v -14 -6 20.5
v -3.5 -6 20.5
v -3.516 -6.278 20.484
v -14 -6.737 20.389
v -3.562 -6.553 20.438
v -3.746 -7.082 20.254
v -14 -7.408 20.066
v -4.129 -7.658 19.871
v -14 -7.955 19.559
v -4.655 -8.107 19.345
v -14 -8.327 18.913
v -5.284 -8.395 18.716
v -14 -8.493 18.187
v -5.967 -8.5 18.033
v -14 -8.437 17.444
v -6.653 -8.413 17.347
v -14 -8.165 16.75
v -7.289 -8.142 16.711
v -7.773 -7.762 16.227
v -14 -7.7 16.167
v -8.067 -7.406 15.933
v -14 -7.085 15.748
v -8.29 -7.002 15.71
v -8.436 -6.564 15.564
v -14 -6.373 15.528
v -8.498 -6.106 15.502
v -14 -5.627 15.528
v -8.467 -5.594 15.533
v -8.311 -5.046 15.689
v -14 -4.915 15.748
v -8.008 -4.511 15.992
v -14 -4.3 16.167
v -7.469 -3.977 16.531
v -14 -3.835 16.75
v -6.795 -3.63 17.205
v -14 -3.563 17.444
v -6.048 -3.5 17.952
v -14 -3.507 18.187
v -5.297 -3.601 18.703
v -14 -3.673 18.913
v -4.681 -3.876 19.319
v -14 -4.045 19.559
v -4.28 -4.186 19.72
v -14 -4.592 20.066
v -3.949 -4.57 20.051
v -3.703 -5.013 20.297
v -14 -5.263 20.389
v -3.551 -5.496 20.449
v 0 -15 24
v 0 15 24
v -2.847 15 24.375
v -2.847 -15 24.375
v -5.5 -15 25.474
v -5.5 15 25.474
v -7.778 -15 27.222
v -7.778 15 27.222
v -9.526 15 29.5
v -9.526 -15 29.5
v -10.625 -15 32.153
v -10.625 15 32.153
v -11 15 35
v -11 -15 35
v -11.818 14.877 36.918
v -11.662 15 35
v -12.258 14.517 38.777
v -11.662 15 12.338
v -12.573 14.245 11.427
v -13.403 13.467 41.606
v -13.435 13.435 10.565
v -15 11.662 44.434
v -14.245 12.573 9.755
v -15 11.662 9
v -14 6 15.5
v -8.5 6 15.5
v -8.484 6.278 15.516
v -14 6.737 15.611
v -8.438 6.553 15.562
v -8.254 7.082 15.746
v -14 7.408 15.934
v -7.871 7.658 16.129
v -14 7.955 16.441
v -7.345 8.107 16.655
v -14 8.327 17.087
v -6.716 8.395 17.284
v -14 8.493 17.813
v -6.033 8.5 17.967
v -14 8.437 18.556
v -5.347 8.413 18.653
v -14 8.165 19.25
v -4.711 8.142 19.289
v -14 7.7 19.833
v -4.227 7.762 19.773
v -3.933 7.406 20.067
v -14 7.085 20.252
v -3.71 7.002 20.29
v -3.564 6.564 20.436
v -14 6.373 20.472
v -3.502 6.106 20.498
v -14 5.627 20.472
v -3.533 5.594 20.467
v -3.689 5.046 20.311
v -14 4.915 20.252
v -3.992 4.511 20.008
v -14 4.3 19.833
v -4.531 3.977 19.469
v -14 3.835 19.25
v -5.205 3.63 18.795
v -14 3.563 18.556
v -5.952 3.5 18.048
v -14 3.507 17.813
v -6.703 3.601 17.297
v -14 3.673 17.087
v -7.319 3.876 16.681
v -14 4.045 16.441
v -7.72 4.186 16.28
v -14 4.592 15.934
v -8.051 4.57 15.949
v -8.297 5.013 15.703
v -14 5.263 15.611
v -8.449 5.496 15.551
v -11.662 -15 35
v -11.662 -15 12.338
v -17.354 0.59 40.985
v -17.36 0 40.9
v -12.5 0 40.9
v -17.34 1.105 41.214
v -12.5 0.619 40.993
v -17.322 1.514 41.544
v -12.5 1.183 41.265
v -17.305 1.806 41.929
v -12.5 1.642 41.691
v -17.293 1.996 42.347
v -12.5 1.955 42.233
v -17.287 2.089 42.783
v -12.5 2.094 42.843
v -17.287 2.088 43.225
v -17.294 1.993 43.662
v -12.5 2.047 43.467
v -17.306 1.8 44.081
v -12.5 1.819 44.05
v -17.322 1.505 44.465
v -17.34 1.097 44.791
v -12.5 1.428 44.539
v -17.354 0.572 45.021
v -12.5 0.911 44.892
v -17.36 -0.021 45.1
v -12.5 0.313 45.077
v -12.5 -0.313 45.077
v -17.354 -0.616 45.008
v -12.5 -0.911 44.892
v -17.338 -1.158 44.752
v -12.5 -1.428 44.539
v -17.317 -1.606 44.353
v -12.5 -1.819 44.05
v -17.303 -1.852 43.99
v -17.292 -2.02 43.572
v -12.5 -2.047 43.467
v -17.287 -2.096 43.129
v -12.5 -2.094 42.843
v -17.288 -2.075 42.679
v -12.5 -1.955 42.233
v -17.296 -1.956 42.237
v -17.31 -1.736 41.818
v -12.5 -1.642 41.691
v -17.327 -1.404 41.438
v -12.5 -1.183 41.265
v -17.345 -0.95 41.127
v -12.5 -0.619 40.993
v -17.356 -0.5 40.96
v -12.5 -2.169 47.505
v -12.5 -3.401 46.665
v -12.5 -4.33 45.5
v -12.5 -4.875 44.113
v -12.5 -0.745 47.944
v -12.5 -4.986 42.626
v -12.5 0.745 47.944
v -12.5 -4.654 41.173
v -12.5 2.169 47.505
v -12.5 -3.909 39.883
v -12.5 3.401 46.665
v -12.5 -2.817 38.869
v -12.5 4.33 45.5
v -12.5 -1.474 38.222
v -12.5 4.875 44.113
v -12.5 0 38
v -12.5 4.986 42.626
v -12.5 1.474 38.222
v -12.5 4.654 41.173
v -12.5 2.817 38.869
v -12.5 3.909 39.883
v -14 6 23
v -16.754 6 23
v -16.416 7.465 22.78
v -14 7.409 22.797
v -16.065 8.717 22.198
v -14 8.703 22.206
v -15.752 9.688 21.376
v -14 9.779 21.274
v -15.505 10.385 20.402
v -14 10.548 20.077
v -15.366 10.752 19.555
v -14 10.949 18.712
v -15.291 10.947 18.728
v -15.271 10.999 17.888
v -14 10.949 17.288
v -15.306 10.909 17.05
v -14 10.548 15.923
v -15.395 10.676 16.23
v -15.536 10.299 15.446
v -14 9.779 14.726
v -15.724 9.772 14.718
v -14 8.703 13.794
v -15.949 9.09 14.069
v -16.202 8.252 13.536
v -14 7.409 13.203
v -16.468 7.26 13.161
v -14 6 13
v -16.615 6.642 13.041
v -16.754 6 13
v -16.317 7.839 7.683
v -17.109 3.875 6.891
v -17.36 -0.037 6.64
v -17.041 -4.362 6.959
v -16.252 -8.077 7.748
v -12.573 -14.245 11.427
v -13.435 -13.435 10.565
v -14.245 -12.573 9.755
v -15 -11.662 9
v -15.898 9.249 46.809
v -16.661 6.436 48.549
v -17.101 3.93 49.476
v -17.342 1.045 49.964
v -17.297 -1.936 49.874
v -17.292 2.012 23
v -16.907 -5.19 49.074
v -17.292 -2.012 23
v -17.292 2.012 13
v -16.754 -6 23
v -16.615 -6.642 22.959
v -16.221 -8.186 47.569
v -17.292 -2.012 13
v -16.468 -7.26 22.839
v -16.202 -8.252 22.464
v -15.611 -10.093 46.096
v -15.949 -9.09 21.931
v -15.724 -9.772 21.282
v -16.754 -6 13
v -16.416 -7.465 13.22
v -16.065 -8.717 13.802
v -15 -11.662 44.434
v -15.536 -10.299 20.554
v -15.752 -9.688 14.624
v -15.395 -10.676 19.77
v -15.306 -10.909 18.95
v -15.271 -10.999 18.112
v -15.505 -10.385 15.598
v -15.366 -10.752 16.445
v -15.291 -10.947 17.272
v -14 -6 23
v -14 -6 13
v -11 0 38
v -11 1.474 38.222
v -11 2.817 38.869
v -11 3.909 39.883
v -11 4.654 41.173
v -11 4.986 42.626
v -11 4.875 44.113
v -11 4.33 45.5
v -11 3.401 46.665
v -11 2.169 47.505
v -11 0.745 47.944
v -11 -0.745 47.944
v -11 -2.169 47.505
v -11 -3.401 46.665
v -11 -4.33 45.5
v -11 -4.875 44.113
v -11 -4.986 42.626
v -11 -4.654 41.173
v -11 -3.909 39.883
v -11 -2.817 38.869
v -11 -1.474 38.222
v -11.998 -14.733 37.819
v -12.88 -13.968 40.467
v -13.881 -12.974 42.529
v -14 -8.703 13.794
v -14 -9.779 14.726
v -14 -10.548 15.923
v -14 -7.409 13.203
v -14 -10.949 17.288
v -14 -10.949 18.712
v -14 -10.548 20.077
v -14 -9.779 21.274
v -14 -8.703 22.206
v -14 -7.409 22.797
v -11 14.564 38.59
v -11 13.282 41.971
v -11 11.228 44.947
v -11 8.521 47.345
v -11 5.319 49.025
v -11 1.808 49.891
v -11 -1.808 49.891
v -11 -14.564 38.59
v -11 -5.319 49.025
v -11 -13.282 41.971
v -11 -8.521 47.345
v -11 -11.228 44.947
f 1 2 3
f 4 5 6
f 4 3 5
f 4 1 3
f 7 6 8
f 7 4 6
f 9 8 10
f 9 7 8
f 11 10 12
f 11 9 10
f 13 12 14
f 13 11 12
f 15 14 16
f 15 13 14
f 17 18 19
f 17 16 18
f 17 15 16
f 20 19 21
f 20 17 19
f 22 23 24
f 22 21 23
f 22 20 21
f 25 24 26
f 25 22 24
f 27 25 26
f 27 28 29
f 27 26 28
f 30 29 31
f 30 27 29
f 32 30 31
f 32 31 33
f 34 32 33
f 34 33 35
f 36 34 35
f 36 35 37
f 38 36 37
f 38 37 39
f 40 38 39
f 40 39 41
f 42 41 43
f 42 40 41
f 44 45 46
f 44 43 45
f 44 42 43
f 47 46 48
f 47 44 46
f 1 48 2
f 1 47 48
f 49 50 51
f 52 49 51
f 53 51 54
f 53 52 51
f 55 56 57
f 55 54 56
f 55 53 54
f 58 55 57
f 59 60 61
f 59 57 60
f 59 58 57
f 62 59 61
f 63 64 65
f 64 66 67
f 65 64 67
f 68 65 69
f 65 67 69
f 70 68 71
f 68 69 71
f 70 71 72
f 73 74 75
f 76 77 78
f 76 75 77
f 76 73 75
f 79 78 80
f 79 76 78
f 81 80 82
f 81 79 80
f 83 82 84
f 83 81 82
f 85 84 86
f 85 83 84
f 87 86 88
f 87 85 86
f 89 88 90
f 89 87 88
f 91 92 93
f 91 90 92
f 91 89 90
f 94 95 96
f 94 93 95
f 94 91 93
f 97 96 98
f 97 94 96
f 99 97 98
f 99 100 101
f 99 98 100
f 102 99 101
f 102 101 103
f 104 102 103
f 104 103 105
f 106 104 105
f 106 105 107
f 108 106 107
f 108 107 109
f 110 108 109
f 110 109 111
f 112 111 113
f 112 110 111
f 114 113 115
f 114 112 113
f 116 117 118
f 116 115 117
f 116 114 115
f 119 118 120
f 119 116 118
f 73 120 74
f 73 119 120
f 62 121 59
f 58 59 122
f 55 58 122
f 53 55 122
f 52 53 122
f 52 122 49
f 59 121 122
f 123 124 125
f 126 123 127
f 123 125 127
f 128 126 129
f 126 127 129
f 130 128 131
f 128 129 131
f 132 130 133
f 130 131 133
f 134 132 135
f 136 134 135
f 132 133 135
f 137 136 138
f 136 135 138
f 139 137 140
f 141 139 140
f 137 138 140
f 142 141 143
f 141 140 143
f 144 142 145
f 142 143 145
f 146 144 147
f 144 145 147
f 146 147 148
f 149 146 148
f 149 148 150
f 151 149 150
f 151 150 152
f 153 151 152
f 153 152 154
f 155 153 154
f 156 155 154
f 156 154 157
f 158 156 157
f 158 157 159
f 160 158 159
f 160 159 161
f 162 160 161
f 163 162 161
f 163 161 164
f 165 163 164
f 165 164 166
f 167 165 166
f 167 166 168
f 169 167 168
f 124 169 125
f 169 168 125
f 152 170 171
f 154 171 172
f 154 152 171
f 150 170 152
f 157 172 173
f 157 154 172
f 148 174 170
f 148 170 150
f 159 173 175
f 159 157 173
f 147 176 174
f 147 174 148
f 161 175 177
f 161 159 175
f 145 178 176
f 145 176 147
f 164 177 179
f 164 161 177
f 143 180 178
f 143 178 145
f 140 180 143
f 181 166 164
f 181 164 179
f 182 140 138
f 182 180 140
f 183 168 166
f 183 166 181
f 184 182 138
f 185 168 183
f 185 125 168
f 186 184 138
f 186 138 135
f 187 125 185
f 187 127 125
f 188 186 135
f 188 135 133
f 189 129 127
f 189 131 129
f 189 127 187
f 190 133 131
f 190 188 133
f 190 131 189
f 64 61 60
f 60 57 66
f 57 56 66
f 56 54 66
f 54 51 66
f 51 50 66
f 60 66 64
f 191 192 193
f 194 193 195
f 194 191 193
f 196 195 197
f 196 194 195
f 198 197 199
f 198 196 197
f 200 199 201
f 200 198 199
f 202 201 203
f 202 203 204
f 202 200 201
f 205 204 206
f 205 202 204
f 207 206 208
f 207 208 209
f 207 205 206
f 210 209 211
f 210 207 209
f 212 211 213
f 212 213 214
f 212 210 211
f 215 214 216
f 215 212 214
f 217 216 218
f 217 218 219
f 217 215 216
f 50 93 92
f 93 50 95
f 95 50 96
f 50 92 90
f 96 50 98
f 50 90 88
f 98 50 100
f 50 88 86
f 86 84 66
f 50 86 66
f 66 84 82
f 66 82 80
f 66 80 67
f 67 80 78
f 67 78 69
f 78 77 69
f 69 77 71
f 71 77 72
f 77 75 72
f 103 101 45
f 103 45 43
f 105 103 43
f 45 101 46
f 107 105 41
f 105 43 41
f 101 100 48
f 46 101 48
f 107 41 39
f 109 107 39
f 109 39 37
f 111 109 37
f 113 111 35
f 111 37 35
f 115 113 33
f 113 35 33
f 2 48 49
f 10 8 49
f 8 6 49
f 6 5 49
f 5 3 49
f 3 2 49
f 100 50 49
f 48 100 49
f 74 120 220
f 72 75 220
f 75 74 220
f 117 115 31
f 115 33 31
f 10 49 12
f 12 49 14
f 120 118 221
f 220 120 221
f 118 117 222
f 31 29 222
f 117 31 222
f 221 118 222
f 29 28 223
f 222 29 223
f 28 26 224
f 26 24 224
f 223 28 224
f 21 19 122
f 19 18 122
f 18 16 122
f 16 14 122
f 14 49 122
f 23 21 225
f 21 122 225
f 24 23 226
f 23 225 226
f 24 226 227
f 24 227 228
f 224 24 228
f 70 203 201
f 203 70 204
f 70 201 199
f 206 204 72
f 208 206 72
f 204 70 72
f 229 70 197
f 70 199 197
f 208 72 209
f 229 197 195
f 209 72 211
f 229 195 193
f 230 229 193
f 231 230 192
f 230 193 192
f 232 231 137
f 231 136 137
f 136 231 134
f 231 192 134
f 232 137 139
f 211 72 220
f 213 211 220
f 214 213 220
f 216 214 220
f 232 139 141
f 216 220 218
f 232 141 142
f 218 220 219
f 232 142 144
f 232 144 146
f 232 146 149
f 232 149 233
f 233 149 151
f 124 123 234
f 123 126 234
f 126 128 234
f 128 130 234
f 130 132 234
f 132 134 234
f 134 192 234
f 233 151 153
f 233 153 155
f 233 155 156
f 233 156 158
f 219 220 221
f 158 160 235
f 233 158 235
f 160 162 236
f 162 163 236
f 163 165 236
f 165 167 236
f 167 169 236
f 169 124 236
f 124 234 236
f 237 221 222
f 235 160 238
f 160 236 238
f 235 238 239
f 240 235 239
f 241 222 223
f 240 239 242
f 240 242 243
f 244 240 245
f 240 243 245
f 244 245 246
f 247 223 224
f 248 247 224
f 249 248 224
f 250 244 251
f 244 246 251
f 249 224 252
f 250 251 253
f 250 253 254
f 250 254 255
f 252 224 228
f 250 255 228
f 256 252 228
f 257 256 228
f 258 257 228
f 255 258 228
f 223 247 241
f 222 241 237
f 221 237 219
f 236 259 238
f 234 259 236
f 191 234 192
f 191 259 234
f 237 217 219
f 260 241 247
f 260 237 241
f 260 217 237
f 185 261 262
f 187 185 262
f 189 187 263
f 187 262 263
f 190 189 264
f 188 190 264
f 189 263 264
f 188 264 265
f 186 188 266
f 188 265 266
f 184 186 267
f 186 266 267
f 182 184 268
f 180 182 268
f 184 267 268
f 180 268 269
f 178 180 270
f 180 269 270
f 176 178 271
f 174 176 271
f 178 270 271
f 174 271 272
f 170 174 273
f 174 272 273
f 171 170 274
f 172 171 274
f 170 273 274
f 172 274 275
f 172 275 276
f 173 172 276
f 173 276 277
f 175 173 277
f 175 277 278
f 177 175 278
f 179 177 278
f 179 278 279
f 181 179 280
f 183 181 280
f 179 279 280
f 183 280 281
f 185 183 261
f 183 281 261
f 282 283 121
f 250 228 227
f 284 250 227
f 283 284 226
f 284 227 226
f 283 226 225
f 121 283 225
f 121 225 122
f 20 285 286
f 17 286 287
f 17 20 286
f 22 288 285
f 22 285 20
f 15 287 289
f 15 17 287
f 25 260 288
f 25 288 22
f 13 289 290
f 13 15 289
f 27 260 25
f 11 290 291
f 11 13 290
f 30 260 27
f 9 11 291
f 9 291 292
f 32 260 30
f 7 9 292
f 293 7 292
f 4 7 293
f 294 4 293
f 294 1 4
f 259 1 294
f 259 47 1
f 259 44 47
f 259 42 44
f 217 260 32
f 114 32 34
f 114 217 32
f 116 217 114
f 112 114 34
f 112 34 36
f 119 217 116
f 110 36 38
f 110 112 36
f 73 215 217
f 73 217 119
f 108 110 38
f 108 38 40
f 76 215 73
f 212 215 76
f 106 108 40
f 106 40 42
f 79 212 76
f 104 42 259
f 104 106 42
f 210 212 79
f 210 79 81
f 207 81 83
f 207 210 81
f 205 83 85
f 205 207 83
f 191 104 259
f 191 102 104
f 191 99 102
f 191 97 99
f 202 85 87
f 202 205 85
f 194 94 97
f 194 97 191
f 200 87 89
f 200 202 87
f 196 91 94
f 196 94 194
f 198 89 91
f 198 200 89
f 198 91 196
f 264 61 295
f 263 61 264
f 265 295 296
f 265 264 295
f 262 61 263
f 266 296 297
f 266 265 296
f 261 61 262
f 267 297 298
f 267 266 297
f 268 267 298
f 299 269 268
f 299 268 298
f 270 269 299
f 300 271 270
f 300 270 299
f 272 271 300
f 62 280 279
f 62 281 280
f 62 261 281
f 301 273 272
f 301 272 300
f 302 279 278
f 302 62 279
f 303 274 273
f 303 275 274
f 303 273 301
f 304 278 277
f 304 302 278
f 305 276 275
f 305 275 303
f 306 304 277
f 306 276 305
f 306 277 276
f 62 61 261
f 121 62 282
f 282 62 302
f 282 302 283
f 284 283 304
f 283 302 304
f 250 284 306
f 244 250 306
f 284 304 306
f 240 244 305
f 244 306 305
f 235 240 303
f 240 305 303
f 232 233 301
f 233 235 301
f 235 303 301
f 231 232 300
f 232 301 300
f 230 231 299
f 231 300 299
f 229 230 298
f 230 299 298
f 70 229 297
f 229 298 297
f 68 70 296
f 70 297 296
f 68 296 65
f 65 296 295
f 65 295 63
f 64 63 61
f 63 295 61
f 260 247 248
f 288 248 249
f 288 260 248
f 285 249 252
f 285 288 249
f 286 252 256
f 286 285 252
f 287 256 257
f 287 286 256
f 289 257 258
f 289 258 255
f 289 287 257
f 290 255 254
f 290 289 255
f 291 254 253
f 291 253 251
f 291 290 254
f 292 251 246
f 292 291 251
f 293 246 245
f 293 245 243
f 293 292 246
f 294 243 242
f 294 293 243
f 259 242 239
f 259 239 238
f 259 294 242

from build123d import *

# Parameters (mm, degrees)
BOSS_EXTRUDE1_DEPTH     = 50
CUT_EXTRUDE1_DEPTH      = 56.012411105
CUT_EXTRUDE1_DEPTH_BACK = 56.012411105
SKETCH3_R               = 11.25
CUT_EXTRUDE2_DEPTH      = 7
CUT_EXTRUDE3_DEPTH      = 24
CUT_EXTRUDE3_DEPTH_BACK = 3
SKETCH5_R               = 2
CUT_EXTRUDE4_DEPTH      = 56.012411105
CUT_EXTRUDE4_DEPTH_BACK = 56.012411105
CUT_EXTRUDE5_DEPTH      = 3
CUT_EXTRUDE5_DEPTH_BACK = 15
SKETCH7_R               = 2.5
CUT_EXTRUDE7_DEPTH      = 10
CUT_EXTRUDE7_DEPTH_BACK = 1
CUT_EXTRUDE8_DEPTH      = 10
SKETCH11_R              = 2.1
CUT_EXTRUDE9_DEPTH      = 10
SKETCH12_R              = 5
CUT_EXTRUDE10_DEPTH     = 1.5


with BuildPart() as part:
    # Sketch1 → Boss-Extrude1 (new body)
    with BuildSketch(Plane.XY):
        with BuildLine():
            Line((-11.66190379, -15), (11.66190379, -15))
            ThreePointArc((11.66190379, -15), (13.435028843, -13.435028843), (15, -11.66190379))
            ThreePointArc((15, -11.66190379), (17.359878328, 0), (15, 11.66190379))
            ThreePointArc((15, 11.66190379), (13.435028843, 13.435028843), (11.66190379, 15))
            Line((11.66190379, 15), (-11.66190379, 15))
            ThreePointArc((-11.66190379, 15), (-13.435028843, 13.435028843), (-15, 11.66190379))
            ThreePointArc((-15, 11.66190379), (-17.359878328, 0), (-15, -11.66190379))
            ThreePointArc((-15, -11.66190379), (-13.435028843, -13.435028843), (-11.66190379, -15))
        make_face()
    extrude(amount=BOSS_EXTRUDE1_DEPTH)

    # Sketch2 → Cut-Extrude1 (cut, two sides: drawn at the far end of the back side and taken through both)
    with BuildSketch(Plane(origin=(0, 0, 0), x_dir=(1, 0, 0), z_dir=(0, 1, 0)).offset(-CUT_EXTRUDE1_DEPTH_BACK)):
        with BuildLine():
            Line((-11, -35), (-11, -50))
            Line((-11, -50), (11, -50))
            Line((11, -50), (11, -35))
            ThreePointArc((11, -35), (0, -24), (-11, -35))
        make_face()
    extrude(amount=CUT_EXTRUDE1_DEPTH + CUT_EXTRUDE1_DEPTH_BACK, mode=Mode.SUBTRACT)

    # Sketch3 → Cut-Extrude2 (cut)
    with BuildSketch(Plane(origin=(0, 0, 0), x_dir=(-1, 0, 0), z_dir=(0, 0, -1))):
        Circle(SKETCH3_R)
    extrude(amount=-CUT_EXTRUDE2_DEPTH, mode=Mode.SUBTRACT)

    # Sketch4 → Cut-Revolve1 (revolve, cut)
    with BuildSketch(Plane(origin=(0, 0, 0), x_dir=(1, 0, 0), z_dir=(0, 1, 0)), mode=Mode.PRIVATE) as cut_revolve1_sk:
        Polygon((0, -7), (9, -7), (0, -9), align=None)
    revolve(cut_revolve1_sk.sketch.rotate(Axis((0, 0, 9), (0, 0, -1)), 180), axis=Axis((0, 0, 9), (0, 0, -1)), mode=Mode.SUBTRACT)

    # Sketch5 → Cut-Extrude3 (cut, two sides: drawn at the far end of the back side and taken through both)
    with BuildSketch(Plane.ZY.offset(-11).offset(-CUT_EXTRUDE3_DEPTH_BACK)):
        with Locations((43, 0)):
            Circle(SKETCH5_R)
    extrude(amount=CUT_EXTRUDE3_DEPTH + CUT_EXTRUDE3_DEPTH_BACK, mode=Mode.SUBTRACT)

    # Sketch6 → Cut-Extrude4 (cut, two sides: drawn at the far end of the back side and taken through both)
    with BuildSketch(Plane(origin=(0, 0, 0), x_dir=(1, 0, 0), z_dir=(0, 1, 0)).offset(-CUT_EXTRUDE4_DEPTH_BACK)):
        Polygon((0, -24), (-19.504315736, -4.495684264), (-19.504315736, 1.223091499), (17.994194722, 1.223091499), (17.994194722, -52.44895982), (0, -52.44895982), align=None)
    extrude(amount=CUT_EXTRUDE4_DEPTH + CUT_EXTRUDE4_DEPTH_BACK, mode=Mode.SUBTRACT)

    # Sketch7 → Cut-Extrude5 (cut, two sides: drawn at the far end of the back side and taken through both)
    with BuildSketch(Plane(origin=(0, 0, 0), x_dir=(0, 0, -1), z_dir=(1, 0, 0)).offset(-CUT_EXTRUDE5_DEPTH_BACK)):
        with Locations((-18, 6)):
            Circle(SKETCH7_R)
        with Locations(Location((-18, -6, 0), (0, 0, 180))):
            Circle(SKETCH7_R)
    extrude(amount=CUT_EXTRUDE5_DEPTH + CUT_EXTRUDE5_DEPTH_BACK, mode=Mode.SUBTRACT)

    # Sketch9 → Cut-Extrude7 (cut, two sides: drawn at the far end of the back side and taken through both)
    with BuildSketch(Plane.ZY.offset(15).offset(-CUT_EXTRUDE7_DEPTH_BACK)):
        with BuildLine():
            Line((13, 6), (13, -6))
            ThreePointArc((13, -6), (18, -11), (23, -6))
            Line((23, -6), (23, 6))
            ThreePointArc((23, 6), (18, 11), (13, 6))
        make_face()
    extrude(amount=CUT_EXTRUDE7_DEPTH + CUT_EXTRUDE7_DEPTH_BACK, mode=Mode.SUBTRACT)

    # Sketch10 → Cut-Extrude8 (cut)
    with BuildSketch(Plane(origin=(-11, 0, 0), x_dir=(0, 0, -1), z_dir=(1, 0, 0))):
        with BuildLine():
            Line((-35, 15), (-35, 16.580470579))
            Line((-35, 16.580470579), (-52.035721035, 16.580470579))
            Line((-52.035721035, 16.580470579), (-52.035721035, -15.90001351))
            Line((-52.035721035, -15.90001351), (-35, -15.90001351))
            Line((-35, -15.90001351), (-35, -15))
            ThreePointArc((-35, -15), (-50, 0), (-35, 15))
        make_face()
    extrude(amount=-CUT_EXTRUDE8_DEPTH, mode=Mode.SUBTRACT)

    # Sketch11 → Cut-Extrude9 (cut)
    with BuildSketch(Plane(origin=(-11, 0, 0), x_dir=(0, 0, -1), z_dir=(1, 0, 0))):
        with Locations((-43, 0)):
            Circle(SKETCH11_R)
    extrude(amount=-CUT_EXTRUDE9_DEPTH, mode=Mode.SUBTRACT)

    # Sketch12 → Cut-Extrude10 (cut)
    with BuildSketch(Plane(origin=(-11, 0, 0), x_dir=(0, 0, -1), z_dir=(1, 0, 0))):
        with Locations((-43, 0)):
            Circle(SKETCH12_R)
    extrude(amount=-CUT_EXTRUDE10_DEPTH, mode=Mode.SUBTRACT)


solid = part.part
